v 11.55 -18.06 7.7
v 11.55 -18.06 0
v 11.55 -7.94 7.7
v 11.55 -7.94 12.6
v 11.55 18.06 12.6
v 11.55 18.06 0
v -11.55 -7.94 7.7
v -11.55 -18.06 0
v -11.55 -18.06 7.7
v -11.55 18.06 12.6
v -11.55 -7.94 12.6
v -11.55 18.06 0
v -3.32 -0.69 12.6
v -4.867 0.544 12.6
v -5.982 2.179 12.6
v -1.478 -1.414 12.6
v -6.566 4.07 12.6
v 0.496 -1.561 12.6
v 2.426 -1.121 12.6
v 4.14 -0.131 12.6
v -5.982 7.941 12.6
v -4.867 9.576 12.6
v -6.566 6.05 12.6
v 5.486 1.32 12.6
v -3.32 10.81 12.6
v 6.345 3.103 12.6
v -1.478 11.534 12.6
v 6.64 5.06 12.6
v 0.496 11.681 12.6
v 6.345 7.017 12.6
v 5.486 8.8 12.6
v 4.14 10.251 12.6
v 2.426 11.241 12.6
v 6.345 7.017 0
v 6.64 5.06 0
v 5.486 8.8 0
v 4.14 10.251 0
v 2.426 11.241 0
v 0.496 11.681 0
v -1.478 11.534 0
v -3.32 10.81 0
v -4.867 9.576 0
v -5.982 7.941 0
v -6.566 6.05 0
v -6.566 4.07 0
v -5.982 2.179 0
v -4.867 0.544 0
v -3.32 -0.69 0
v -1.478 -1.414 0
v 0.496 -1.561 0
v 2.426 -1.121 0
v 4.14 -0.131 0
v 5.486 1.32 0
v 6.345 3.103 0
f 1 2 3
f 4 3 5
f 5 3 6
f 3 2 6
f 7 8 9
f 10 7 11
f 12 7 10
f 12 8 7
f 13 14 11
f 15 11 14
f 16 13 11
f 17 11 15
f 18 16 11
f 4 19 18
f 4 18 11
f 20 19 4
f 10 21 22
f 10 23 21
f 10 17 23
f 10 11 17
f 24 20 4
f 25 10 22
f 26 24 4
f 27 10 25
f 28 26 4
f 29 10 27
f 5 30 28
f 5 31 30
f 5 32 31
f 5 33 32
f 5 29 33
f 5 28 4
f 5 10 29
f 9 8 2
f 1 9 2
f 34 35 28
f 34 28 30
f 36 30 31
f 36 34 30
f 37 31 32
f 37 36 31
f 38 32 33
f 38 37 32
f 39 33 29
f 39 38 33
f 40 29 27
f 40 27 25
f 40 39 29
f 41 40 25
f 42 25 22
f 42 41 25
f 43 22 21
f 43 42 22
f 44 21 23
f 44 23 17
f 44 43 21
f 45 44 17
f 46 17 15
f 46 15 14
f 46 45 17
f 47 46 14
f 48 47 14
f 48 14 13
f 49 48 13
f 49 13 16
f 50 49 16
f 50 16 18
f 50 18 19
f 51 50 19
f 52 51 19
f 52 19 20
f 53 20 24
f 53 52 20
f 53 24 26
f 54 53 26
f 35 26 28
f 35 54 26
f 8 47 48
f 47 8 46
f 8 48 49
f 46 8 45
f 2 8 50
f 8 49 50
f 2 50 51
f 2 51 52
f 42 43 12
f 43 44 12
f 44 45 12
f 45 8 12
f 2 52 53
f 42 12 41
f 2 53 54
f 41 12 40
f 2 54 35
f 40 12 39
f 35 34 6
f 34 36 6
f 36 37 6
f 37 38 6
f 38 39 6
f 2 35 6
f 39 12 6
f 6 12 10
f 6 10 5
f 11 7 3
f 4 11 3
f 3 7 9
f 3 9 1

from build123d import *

# Parameters (mm, degrees)
F0_W     = 23.1
F0_H     = 36.12
F2_DEPTH = 7.7
F1_W     = 23.1
F1_H     = 26
F3_DEPTH = 12.6
F4_R     = 6.64
F5_DEPTH = 12.6


with BuildPart() as f2:
    # F0 (on Top) → F2 (new body)
    with BuildSketch(Plane.XY):
        Rectangle(F0_W, F0_H)
    extrude(amount=F2_DEPTH)

    # F1 (on Top) → F3 (join)
    with BuildSketch(Plane.XY):
        with Locations((0, 5.06)):
            Rectangle(F1_W, F1_H)
    extrude(amount=F3_DEPTH)

    # F4 (on Top) → F5 (cut)
    with BuildSketch(Plane.XY):
        with Locations((0, 5.06)):
            Circle(F4_R)
    extrude(amount=F5_DEPTH, mode=Mode.SUBTRACT)


solid = f2.part
